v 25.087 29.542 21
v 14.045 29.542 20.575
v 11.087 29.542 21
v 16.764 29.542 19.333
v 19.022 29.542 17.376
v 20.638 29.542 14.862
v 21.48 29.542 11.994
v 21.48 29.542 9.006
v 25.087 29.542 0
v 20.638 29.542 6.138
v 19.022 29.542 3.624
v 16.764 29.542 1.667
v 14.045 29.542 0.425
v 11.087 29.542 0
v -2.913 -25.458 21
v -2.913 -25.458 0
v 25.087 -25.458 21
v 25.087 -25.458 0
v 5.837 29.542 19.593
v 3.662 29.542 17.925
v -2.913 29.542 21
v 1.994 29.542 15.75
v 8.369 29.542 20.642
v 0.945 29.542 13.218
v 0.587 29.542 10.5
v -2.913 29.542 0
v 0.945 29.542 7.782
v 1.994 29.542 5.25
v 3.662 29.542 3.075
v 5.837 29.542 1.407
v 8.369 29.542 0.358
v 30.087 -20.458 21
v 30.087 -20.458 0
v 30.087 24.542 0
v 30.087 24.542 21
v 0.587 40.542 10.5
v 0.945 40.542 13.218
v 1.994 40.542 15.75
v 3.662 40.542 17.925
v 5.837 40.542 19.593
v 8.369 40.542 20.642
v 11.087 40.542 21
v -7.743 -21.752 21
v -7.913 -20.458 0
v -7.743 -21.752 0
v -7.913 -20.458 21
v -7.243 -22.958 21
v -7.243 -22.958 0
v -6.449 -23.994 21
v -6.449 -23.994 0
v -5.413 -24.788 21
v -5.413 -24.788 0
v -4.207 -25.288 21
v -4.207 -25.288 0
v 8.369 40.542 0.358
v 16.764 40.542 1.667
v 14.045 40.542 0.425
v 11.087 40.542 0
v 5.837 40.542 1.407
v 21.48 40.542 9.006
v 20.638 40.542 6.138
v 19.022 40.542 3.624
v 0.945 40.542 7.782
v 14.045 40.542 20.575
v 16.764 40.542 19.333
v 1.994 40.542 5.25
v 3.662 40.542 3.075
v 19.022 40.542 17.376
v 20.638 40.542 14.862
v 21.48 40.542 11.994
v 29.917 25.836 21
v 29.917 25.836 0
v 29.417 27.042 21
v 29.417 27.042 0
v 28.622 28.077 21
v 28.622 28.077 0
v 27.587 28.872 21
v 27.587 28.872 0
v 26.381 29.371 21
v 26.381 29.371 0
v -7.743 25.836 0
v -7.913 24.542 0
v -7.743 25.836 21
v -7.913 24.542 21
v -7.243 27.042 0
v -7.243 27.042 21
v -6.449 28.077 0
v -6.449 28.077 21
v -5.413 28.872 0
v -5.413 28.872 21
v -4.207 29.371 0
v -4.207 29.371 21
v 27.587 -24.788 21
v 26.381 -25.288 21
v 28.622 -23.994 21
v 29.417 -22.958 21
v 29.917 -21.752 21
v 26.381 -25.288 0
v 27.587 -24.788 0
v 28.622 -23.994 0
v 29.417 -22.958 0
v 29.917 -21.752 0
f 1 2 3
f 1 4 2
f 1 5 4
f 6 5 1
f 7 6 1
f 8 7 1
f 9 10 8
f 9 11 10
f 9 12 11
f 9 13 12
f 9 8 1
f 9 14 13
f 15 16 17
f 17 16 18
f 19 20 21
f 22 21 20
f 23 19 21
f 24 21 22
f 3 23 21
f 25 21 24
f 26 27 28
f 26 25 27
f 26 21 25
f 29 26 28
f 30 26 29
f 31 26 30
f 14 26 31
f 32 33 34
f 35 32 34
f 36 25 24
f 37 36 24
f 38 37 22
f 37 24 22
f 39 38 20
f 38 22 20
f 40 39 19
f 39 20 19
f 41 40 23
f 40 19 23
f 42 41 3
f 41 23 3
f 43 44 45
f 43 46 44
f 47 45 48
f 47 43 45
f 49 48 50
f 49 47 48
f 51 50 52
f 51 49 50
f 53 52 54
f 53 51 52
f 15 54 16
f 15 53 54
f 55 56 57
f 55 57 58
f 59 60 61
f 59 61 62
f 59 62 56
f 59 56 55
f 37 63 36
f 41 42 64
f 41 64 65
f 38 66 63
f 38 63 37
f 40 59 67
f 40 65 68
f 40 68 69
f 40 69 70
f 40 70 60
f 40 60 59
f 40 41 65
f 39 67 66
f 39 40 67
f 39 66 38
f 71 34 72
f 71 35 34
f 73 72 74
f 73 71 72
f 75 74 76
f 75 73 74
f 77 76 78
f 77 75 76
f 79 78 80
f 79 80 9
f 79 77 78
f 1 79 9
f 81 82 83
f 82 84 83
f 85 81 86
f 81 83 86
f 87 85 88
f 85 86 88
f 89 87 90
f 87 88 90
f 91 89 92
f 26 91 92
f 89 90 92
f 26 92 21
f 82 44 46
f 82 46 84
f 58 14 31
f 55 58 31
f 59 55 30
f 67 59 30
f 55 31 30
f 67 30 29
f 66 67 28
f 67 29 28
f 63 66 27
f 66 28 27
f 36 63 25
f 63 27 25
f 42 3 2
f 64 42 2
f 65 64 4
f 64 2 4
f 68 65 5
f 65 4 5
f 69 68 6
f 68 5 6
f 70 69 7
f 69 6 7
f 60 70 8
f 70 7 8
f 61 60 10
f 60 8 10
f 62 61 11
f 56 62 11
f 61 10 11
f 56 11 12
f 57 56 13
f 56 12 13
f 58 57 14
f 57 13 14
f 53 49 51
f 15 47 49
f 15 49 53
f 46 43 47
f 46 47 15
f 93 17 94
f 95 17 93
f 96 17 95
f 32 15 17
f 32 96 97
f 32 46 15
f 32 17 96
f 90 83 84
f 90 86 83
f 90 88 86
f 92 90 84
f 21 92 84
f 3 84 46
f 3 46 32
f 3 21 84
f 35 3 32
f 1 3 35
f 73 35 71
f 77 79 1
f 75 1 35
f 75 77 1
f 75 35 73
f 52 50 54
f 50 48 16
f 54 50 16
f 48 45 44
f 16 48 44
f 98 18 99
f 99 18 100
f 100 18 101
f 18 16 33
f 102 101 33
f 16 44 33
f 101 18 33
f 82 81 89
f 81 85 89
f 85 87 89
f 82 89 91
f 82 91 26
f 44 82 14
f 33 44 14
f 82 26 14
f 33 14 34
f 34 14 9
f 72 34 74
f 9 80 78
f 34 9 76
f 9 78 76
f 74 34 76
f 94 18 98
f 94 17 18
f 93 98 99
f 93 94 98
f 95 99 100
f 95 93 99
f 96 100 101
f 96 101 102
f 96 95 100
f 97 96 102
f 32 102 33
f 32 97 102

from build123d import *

# Parameters (mm, degrees)
F0_W     = 38
F0_H     = 55
F1_DEPTH = 21
F3_DEPTH = 11
F4_R     = 5


with BuildPart() as f1:
    # F0 (on Top) → F1 (new body)
    with BuildSketch(Plane.XY):
        with Locations((11.086939, 2.041674)):
            Rectangle(F0_W, F0_H)
    extrude(amount=F1_DEPTH)

    # F2 (on face) → F3 (join)
    with BuildSketch(Plane(origin=(0, 29.541674, 0), x_dir=(-1, 0, 0), z_dir=(0, 1, 0))):
        with BuildLine():
            ThreePointArc((-11.086939, 0), (-3.662318, 3.075379), (-0.586939, 10.5))
            ThreePointArc((-0.586939, 10.5), (-3.662318, 17.924621), (-11.086939, 21))
            ThreePointArc((-11.086939, 21), (-21.586939, 10.5), (-11.086939, 0))
        make_face()
    extrude(amount=F3_DEPTH)

    # F4
    f4_edges = [f1.edges().sort_by_distance(p)[0] for p in [
        (-7.913061, 29.541674, 10.5),
        (30.086939, 29.541674, 10.5),
        (30.086939, -25.458326, 10.5),
        (-7.913061, -25.458326, 10.5),
    ]]
    fillet(f4_edges, radius=F4_R)


solid = f1.part
